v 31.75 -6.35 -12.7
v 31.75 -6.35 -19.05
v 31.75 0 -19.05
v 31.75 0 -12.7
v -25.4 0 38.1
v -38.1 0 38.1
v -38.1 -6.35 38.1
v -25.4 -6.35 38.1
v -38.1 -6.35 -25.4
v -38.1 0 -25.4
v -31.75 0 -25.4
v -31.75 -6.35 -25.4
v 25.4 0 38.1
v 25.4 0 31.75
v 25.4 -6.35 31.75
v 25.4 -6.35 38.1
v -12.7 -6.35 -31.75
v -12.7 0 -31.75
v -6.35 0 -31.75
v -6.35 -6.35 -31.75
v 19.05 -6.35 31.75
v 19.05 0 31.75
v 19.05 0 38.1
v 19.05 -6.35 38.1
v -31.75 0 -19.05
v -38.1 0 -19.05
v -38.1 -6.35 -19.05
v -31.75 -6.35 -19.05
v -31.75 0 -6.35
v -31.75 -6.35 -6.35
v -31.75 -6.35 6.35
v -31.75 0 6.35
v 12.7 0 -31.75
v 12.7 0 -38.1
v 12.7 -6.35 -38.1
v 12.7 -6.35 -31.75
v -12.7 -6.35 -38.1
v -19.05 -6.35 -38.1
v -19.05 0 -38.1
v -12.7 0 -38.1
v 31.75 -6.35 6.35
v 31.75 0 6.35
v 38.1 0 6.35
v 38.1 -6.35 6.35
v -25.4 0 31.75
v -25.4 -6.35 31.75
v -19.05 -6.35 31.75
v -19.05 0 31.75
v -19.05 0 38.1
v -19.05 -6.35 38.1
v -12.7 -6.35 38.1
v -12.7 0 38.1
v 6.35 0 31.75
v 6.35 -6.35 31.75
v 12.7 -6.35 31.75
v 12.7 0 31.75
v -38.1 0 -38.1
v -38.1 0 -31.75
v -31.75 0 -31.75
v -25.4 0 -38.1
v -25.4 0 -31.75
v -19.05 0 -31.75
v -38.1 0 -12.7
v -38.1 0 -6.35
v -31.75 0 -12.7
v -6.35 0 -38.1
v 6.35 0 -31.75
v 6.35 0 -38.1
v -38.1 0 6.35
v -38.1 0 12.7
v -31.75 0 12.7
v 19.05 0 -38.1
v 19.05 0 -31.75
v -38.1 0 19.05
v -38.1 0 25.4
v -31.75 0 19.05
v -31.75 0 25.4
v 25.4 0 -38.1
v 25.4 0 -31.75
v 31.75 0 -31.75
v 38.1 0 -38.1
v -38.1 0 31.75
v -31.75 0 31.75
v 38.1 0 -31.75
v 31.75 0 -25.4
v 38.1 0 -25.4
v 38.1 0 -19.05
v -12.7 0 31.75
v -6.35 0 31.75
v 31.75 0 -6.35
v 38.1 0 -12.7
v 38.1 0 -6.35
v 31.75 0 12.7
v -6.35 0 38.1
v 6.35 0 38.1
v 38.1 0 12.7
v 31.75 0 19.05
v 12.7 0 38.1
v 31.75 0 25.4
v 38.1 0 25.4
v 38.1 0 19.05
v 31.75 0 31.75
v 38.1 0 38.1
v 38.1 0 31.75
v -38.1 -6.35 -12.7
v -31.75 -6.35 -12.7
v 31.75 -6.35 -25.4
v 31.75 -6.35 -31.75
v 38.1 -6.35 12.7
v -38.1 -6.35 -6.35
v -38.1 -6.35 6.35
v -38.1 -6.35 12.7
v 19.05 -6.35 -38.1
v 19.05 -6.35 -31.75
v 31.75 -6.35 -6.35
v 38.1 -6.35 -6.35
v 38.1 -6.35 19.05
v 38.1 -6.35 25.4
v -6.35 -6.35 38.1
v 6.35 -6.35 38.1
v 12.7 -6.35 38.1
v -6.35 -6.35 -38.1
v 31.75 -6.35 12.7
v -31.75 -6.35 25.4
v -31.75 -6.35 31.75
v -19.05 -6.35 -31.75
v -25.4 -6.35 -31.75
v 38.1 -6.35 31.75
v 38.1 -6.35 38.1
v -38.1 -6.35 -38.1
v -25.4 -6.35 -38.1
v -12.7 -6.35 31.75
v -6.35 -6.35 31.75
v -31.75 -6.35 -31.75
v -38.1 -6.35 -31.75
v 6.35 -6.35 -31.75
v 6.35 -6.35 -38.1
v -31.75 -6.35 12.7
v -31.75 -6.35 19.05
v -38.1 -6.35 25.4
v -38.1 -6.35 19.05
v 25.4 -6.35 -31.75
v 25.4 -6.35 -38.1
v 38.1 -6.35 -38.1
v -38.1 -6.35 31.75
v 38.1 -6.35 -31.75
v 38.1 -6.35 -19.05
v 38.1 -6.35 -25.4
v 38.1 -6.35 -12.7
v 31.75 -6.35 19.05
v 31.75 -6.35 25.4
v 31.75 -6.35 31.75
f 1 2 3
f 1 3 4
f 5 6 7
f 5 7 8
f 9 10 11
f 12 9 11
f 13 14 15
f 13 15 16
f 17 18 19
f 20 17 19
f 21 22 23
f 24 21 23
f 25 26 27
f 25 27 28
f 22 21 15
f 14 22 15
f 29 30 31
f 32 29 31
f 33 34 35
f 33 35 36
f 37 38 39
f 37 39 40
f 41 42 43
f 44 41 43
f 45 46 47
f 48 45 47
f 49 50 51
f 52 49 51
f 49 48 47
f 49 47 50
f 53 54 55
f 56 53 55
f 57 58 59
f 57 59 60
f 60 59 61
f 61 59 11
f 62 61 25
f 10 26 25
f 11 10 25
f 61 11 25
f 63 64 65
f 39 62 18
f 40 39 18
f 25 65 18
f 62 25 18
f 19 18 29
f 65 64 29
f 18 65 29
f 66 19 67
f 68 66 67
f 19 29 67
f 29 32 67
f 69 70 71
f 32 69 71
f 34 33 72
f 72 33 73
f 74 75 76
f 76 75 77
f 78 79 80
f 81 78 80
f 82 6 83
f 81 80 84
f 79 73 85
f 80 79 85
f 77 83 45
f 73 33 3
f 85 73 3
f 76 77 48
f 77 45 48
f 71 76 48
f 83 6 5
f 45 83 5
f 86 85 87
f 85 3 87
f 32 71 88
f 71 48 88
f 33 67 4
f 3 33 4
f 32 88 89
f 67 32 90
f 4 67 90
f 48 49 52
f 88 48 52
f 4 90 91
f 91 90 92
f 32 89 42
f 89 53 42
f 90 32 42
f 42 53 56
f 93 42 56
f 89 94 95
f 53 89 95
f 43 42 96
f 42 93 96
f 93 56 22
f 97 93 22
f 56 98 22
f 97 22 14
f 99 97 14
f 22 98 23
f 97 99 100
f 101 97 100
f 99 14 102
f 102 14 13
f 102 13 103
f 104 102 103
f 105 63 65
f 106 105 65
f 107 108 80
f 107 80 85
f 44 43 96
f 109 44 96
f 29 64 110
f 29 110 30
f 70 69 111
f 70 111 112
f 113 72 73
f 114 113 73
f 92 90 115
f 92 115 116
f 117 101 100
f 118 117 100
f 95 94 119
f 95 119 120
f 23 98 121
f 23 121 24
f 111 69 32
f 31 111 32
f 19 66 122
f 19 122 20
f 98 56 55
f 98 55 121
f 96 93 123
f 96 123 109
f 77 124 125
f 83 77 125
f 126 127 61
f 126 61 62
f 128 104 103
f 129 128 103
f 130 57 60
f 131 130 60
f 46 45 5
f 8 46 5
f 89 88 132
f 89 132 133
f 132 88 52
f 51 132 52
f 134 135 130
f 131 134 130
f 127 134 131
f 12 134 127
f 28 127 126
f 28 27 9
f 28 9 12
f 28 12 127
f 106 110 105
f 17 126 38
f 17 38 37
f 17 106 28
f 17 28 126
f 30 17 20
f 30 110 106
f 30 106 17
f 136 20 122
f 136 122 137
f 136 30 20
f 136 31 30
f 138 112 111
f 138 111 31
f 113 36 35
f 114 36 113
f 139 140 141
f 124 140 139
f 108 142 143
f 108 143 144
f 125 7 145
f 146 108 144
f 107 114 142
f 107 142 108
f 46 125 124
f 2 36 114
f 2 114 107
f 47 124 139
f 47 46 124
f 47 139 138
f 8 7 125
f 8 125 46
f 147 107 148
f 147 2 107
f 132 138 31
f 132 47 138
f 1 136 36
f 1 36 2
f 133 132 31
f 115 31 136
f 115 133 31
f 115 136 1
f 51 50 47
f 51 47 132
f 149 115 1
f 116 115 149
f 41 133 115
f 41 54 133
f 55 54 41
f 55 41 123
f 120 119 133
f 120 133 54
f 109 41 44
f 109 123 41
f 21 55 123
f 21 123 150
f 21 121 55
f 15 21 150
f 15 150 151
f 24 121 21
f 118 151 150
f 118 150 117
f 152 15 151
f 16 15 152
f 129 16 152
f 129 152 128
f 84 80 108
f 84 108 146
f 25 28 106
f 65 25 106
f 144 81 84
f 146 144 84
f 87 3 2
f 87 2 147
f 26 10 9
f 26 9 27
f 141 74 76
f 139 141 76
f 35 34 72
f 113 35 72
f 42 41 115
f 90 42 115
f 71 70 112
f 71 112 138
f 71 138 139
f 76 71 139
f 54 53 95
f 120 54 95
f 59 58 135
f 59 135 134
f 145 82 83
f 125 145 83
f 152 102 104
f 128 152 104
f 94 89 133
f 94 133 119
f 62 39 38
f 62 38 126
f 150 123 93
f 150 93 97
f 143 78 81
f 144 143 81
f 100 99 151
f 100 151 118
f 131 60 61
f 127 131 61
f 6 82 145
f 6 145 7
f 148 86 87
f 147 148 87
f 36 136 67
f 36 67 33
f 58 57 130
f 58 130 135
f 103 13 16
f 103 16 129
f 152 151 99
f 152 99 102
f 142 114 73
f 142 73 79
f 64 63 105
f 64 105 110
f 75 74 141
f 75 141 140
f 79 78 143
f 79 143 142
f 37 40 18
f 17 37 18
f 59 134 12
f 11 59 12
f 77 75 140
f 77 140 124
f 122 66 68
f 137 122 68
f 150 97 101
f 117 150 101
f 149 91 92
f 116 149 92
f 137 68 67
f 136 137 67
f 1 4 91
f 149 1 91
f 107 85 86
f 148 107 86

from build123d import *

# Parameters (mm, degrees)
F0_W     = 76.2
F0_H     = 76.2
F1_DEPTH = 6.35
F2_W     = 6.35
F2_H     = 6.35
F3_DEPTH = 6.351
F4_W     = 6.35
F4_H     = 6.35
F5_DEPTH = 6.351
F6_W     = 6.35
F6_H     = 6.35
F6_H_2   = 12.7
F7_DEPTH = 6.351


# Not quite as in the source:
# - a feature names something its author has since deleted; it is built from what else it names


with BuildPart() as f1:
    # F0 (on Front) → F1 (new body)
    with BuildSketch(Plane.XZ):
        Rectangle(F0_W, F0_H)
    extrude(amount=F1_DEPTH)

    # F2 (on face) → F3 (cut, through all)
    with BuildSketch(Plane.XZ.offset(6.35)):
        with Locations((-22.225, 34.925)):
            Rectangle(F2_W, F2_H)
        with Locations((-9.525, 34.925)):
            Rectangle(F2_W, F2_H)
        with Locations((9.525, 34.925)):
            Rectangle(F2_W, F2_H)
        with Locations((22.225, 34.925)):
            Rectangle(F2_W, F2_H)
    extrude(amount=-F3_DEPTH, mode=Mode.SUBTRACT)

    # F4 (on face) → F5 (cut, through all)
    with BuildSketch(Plane.XZ.offset(6.35)):
        with Locations((-9.525, -34.925)):
            Rectangle(F4_W, F4_H)
        with Locations((9.525, -34.925)):
            Rectangle(F4_W, F4_H)
        with Locations((22.225, -34.925)):
            Rectangle(F4_W, F4_H)
        with Locations((-22.225, -34.925)):
            Rectangle(F4_W, F4_H)
    extrude(amount=-F5_DEPTH, mode=Mode.SUBTRACT)

    # F6 (on face) → F7 (cut, through all)
    with BuildSketch(Plane.XZ.offset(6.35)):
        with Locations((-34.925, -28.575)):
            Rectangle(F6_W, F6_H)
        with Locations((-34.925, -15.875)):
            Rectangle(F6_W, F6_H)
        with Locations((-34.925, 0)):
            Rectangle(F6_W, F6_H_2)
        with Locations((-34.925, 15.875)):
            Rectangle(F6_W, F6_H)
        with Locations((-34.925, 28.575)):
            Rectangle(F6_W, F6_H)
        with Locations((34.925, -28.575)):
            Rectangle(F6_W, F6_H)
        with Locations((34.925, -15.875)):
            Rectangle(F6_W, F6_H)
        with Locations((34.925, -3.175)):
            Rectangle(F6_W, F6_H)
        with Locations((34.925, 3.175)):
            Rectangle(F6_W, F6_H)
        with Locations((34.925, 15.875)):
            Rectangle(F6_W, F6_H)
        with Locations((34.925, 28.575)):
            Rectangle(F6_W, F6_H)
    extrude(amount=-F7_DEPTH, mode=Mode.SUBTRACT)


solid = f1.part
